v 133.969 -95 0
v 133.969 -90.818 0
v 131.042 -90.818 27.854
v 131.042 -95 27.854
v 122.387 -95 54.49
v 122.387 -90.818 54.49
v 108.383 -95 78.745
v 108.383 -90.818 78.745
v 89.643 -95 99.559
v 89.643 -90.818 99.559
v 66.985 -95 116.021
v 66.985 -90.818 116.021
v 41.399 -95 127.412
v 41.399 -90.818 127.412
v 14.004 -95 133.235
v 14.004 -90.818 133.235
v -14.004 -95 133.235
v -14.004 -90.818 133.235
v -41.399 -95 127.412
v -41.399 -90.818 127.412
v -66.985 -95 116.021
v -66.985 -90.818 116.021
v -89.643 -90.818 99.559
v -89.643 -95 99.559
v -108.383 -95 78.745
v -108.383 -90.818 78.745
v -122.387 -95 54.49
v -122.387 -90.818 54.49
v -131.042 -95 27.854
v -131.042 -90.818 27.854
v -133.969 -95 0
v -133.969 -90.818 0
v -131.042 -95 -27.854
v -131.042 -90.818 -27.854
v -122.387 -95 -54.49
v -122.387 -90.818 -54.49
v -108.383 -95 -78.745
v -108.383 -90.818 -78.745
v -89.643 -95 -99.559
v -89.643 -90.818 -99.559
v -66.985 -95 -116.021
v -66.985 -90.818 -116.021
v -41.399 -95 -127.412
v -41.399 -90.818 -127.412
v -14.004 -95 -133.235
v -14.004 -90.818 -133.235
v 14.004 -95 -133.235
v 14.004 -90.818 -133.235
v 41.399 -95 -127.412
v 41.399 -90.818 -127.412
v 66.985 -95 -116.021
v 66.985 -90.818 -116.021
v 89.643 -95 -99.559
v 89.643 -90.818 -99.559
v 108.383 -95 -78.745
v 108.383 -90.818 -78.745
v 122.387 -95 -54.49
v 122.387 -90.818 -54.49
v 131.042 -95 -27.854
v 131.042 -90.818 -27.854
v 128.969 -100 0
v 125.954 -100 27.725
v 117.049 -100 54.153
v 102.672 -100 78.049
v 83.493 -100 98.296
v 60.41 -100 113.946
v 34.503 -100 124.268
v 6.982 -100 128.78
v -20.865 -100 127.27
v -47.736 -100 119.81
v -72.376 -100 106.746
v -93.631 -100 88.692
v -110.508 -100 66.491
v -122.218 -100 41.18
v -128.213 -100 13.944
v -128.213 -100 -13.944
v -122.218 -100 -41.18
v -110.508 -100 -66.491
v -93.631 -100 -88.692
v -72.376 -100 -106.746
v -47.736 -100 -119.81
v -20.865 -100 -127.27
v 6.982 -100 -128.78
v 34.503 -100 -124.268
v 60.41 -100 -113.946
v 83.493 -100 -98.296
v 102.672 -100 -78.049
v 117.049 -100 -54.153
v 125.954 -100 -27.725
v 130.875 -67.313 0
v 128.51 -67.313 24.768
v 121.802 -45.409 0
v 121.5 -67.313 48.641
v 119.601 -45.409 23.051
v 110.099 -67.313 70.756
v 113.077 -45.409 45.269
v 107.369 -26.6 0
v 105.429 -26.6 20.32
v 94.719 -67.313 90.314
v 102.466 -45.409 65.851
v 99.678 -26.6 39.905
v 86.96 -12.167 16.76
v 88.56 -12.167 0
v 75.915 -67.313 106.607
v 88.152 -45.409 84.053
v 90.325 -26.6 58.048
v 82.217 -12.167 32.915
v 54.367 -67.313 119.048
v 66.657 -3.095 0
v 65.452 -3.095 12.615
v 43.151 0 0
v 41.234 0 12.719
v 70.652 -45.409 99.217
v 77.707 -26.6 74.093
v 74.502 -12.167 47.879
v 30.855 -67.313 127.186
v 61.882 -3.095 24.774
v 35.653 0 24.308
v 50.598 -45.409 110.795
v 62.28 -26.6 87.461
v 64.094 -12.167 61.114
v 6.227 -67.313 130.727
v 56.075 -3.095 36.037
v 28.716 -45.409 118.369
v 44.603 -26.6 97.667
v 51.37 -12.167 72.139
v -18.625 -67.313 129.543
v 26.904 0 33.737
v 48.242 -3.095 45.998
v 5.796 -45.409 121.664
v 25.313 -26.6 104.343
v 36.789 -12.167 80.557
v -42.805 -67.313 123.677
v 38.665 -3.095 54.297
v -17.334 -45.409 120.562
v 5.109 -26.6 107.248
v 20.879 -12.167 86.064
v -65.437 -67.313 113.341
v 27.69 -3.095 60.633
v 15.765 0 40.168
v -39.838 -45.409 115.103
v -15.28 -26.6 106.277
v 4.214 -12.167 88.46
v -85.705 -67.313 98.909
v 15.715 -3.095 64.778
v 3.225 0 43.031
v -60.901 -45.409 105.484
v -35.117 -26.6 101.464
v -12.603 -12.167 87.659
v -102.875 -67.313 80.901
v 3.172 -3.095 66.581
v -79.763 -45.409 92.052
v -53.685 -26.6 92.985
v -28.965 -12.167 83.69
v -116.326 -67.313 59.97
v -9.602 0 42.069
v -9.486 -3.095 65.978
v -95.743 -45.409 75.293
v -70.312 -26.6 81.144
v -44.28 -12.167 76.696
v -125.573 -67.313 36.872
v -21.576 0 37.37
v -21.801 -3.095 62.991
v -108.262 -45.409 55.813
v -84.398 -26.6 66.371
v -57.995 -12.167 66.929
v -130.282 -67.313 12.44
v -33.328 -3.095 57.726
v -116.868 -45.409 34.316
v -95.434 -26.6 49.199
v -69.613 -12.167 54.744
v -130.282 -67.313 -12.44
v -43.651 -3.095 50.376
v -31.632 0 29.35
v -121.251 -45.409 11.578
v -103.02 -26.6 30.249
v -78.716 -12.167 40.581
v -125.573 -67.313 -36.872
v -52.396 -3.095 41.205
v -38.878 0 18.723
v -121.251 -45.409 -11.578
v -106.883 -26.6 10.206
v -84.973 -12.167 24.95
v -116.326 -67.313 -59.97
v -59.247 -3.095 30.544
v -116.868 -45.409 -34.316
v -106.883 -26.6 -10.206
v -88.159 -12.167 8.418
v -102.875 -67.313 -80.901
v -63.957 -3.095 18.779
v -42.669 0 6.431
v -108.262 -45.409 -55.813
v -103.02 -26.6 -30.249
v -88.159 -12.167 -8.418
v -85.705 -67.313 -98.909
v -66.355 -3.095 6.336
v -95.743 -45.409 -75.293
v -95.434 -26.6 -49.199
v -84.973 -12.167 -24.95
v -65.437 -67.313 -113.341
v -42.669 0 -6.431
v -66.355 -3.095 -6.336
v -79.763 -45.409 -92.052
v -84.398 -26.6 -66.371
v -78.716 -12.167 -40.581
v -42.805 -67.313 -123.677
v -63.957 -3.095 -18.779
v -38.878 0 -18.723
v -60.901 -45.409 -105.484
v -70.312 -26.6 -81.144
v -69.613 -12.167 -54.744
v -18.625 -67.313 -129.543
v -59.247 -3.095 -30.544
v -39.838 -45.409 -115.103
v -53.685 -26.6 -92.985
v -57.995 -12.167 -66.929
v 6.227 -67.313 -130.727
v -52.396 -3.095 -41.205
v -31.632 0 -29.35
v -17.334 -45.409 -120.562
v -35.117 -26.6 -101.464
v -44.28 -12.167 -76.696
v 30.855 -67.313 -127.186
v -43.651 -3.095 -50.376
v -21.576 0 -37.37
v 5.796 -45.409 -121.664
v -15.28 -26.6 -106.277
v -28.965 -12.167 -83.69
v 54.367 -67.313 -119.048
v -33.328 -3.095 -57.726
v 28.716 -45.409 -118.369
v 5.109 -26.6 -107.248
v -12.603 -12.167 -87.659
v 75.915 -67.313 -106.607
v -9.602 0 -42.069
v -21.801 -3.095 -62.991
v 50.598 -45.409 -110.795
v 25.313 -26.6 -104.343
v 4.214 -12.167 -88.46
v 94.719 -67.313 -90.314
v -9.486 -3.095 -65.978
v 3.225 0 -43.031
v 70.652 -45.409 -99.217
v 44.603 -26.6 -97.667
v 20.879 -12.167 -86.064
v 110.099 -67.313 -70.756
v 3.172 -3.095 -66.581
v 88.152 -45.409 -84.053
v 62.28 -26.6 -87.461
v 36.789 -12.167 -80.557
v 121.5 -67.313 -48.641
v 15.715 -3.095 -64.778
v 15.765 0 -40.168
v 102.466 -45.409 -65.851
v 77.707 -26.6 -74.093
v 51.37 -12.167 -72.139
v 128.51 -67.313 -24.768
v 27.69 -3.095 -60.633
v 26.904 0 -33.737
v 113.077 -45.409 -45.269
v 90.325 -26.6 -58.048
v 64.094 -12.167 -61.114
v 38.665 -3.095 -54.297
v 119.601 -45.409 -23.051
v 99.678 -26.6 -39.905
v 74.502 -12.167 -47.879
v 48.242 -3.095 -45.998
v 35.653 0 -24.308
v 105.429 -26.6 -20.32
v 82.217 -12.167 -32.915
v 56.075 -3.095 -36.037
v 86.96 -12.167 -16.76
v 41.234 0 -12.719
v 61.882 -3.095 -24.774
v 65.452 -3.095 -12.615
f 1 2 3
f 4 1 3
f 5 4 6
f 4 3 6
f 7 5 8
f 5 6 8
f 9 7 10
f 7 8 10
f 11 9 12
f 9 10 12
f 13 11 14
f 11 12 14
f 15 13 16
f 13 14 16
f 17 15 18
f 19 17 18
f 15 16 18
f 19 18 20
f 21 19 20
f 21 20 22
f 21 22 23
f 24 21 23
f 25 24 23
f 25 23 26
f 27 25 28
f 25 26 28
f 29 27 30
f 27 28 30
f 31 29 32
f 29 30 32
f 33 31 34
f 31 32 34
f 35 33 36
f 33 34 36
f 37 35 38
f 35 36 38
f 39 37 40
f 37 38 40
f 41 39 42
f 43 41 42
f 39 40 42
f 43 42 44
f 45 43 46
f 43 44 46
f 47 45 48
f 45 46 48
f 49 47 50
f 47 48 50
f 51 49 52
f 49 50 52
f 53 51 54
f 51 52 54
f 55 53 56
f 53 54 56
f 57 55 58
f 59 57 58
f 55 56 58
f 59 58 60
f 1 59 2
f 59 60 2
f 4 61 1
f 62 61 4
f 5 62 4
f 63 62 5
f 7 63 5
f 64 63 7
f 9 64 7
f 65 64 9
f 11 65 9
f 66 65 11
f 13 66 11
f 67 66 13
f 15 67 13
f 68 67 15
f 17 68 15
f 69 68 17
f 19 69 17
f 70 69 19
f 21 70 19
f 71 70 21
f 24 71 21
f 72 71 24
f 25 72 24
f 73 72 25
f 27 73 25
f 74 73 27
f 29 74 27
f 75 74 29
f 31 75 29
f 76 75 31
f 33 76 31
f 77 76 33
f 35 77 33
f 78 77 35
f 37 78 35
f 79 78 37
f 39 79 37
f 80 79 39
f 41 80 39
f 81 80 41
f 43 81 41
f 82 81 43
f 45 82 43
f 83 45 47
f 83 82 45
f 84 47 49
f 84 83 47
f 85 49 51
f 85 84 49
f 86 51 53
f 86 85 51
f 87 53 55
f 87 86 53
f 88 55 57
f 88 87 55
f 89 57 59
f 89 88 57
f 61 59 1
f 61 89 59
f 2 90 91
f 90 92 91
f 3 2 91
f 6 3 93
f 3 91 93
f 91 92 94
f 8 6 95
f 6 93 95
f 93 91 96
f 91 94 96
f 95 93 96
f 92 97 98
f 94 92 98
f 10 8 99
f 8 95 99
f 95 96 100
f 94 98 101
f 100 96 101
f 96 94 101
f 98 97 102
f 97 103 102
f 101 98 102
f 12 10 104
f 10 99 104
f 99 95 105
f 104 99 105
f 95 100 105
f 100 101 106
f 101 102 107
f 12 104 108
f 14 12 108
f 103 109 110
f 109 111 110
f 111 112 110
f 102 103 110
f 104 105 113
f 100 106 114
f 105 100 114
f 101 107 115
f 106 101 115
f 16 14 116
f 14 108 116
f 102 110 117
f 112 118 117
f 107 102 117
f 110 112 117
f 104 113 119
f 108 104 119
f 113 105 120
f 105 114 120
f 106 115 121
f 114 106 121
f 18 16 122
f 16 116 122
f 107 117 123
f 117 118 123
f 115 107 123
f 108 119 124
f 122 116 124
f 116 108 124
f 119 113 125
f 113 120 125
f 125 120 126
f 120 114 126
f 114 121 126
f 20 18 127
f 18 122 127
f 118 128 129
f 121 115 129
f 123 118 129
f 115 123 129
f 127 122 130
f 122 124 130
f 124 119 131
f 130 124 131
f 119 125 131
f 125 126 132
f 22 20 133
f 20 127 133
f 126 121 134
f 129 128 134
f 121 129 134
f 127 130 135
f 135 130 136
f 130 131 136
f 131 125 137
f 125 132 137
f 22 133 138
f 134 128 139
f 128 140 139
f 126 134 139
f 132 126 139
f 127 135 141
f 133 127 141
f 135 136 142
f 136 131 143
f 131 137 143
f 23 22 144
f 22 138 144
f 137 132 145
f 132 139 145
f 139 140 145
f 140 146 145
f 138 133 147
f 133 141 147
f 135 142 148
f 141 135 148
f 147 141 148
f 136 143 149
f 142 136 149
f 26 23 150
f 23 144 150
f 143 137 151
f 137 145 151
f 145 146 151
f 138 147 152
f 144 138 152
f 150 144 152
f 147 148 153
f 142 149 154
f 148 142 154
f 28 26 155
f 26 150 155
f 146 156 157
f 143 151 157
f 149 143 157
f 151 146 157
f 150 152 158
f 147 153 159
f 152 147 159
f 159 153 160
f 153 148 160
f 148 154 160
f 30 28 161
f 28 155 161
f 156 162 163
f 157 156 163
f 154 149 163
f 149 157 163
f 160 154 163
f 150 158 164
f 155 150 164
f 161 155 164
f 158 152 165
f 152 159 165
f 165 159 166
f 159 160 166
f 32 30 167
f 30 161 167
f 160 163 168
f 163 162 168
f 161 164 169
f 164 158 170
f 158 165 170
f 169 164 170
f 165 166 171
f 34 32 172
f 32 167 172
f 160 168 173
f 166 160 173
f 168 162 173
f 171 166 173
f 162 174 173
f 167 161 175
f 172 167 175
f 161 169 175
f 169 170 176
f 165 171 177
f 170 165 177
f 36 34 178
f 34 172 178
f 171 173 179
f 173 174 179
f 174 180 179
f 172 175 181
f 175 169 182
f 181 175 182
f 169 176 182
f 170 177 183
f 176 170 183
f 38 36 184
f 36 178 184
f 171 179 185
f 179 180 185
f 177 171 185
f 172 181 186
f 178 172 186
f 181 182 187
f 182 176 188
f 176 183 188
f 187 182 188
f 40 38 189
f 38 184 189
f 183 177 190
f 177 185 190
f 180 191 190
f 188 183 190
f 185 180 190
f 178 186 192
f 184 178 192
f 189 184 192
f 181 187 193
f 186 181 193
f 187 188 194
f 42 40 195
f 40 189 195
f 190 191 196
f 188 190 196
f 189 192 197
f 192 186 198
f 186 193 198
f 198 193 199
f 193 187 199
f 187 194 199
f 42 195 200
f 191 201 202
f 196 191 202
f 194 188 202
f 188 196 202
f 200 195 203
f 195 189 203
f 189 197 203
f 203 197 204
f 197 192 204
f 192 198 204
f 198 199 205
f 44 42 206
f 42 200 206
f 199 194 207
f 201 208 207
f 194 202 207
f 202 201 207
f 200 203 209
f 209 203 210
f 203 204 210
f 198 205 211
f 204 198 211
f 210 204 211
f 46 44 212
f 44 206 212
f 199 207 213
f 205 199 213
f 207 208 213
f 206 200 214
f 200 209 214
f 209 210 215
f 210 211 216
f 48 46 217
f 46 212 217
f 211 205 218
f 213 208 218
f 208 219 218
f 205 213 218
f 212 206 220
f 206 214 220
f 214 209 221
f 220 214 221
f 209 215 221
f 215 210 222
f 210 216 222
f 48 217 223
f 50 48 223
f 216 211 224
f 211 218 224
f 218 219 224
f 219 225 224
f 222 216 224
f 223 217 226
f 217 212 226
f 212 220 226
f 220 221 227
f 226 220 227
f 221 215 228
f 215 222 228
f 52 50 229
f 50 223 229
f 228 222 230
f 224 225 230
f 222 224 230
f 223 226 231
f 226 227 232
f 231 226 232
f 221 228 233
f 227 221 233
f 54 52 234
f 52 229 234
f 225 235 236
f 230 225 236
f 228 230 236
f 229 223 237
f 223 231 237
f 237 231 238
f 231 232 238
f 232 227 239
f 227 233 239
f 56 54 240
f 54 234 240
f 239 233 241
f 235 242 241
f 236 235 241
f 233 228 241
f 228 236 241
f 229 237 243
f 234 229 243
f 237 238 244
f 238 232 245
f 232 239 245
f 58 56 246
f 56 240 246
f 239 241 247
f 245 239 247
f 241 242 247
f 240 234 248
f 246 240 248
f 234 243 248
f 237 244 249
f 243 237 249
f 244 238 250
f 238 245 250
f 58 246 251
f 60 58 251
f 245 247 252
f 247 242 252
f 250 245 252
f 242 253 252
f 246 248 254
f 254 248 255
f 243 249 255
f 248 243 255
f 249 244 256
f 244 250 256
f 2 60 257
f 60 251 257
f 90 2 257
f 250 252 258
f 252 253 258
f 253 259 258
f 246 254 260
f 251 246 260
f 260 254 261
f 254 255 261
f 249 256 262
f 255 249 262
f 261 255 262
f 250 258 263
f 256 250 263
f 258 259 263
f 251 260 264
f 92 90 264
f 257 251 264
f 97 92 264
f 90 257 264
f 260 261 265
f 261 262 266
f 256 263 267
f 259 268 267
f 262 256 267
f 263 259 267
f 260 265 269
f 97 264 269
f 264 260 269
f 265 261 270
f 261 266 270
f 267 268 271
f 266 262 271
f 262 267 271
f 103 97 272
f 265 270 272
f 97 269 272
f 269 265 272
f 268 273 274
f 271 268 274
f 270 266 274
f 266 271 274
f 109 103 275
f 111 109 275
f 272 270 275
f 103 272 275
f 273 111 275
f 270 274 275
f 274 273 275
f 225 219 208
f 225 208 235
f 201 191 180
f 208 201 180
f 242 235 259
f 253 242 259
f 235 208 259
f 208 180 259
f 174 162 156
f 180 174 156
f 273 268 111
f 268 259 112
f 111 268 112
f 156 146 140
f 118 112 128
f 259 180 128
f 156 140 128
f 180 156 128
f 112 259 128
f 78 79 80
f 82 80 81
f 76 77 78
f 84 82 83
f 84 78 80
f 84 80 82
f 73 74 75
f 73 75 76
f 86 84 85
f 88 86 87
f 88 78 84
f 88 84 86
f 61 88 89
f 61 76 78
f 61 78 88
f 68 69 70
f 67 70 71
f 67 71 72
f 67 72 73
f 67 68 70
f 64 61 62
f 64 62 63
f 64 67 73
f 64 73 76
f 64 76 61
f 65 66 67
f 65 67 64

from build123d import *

# Parameters (mm, degrees)
F0_R     = 133.969332
F1_DEPTH = 100
F2_SIZE  = 5
F3_R     = 90.81794


with BuildPart() as f1:
    # F0 (on Front) → F1 (new body)
    with BuildSketch(Plane.XZ):
        Circle(F0_R)
    extrude(amount=F1_DEPTH)

    # F2
    f2_edges = [f1.edges().sort_by_distance(p)[0] for p in [
        (-133.969332, -100, 0),
    ]]
    chamfer(f2_edges, length=F2_SIZE)

    # F3
    f3_edges = [f1.edges().sort_by_distance(p)[0] for p in [
        (-133.969332, 0, 0),
    ]]
    fillet(f3_edges, radius=F3_R)


solid = f1.part
